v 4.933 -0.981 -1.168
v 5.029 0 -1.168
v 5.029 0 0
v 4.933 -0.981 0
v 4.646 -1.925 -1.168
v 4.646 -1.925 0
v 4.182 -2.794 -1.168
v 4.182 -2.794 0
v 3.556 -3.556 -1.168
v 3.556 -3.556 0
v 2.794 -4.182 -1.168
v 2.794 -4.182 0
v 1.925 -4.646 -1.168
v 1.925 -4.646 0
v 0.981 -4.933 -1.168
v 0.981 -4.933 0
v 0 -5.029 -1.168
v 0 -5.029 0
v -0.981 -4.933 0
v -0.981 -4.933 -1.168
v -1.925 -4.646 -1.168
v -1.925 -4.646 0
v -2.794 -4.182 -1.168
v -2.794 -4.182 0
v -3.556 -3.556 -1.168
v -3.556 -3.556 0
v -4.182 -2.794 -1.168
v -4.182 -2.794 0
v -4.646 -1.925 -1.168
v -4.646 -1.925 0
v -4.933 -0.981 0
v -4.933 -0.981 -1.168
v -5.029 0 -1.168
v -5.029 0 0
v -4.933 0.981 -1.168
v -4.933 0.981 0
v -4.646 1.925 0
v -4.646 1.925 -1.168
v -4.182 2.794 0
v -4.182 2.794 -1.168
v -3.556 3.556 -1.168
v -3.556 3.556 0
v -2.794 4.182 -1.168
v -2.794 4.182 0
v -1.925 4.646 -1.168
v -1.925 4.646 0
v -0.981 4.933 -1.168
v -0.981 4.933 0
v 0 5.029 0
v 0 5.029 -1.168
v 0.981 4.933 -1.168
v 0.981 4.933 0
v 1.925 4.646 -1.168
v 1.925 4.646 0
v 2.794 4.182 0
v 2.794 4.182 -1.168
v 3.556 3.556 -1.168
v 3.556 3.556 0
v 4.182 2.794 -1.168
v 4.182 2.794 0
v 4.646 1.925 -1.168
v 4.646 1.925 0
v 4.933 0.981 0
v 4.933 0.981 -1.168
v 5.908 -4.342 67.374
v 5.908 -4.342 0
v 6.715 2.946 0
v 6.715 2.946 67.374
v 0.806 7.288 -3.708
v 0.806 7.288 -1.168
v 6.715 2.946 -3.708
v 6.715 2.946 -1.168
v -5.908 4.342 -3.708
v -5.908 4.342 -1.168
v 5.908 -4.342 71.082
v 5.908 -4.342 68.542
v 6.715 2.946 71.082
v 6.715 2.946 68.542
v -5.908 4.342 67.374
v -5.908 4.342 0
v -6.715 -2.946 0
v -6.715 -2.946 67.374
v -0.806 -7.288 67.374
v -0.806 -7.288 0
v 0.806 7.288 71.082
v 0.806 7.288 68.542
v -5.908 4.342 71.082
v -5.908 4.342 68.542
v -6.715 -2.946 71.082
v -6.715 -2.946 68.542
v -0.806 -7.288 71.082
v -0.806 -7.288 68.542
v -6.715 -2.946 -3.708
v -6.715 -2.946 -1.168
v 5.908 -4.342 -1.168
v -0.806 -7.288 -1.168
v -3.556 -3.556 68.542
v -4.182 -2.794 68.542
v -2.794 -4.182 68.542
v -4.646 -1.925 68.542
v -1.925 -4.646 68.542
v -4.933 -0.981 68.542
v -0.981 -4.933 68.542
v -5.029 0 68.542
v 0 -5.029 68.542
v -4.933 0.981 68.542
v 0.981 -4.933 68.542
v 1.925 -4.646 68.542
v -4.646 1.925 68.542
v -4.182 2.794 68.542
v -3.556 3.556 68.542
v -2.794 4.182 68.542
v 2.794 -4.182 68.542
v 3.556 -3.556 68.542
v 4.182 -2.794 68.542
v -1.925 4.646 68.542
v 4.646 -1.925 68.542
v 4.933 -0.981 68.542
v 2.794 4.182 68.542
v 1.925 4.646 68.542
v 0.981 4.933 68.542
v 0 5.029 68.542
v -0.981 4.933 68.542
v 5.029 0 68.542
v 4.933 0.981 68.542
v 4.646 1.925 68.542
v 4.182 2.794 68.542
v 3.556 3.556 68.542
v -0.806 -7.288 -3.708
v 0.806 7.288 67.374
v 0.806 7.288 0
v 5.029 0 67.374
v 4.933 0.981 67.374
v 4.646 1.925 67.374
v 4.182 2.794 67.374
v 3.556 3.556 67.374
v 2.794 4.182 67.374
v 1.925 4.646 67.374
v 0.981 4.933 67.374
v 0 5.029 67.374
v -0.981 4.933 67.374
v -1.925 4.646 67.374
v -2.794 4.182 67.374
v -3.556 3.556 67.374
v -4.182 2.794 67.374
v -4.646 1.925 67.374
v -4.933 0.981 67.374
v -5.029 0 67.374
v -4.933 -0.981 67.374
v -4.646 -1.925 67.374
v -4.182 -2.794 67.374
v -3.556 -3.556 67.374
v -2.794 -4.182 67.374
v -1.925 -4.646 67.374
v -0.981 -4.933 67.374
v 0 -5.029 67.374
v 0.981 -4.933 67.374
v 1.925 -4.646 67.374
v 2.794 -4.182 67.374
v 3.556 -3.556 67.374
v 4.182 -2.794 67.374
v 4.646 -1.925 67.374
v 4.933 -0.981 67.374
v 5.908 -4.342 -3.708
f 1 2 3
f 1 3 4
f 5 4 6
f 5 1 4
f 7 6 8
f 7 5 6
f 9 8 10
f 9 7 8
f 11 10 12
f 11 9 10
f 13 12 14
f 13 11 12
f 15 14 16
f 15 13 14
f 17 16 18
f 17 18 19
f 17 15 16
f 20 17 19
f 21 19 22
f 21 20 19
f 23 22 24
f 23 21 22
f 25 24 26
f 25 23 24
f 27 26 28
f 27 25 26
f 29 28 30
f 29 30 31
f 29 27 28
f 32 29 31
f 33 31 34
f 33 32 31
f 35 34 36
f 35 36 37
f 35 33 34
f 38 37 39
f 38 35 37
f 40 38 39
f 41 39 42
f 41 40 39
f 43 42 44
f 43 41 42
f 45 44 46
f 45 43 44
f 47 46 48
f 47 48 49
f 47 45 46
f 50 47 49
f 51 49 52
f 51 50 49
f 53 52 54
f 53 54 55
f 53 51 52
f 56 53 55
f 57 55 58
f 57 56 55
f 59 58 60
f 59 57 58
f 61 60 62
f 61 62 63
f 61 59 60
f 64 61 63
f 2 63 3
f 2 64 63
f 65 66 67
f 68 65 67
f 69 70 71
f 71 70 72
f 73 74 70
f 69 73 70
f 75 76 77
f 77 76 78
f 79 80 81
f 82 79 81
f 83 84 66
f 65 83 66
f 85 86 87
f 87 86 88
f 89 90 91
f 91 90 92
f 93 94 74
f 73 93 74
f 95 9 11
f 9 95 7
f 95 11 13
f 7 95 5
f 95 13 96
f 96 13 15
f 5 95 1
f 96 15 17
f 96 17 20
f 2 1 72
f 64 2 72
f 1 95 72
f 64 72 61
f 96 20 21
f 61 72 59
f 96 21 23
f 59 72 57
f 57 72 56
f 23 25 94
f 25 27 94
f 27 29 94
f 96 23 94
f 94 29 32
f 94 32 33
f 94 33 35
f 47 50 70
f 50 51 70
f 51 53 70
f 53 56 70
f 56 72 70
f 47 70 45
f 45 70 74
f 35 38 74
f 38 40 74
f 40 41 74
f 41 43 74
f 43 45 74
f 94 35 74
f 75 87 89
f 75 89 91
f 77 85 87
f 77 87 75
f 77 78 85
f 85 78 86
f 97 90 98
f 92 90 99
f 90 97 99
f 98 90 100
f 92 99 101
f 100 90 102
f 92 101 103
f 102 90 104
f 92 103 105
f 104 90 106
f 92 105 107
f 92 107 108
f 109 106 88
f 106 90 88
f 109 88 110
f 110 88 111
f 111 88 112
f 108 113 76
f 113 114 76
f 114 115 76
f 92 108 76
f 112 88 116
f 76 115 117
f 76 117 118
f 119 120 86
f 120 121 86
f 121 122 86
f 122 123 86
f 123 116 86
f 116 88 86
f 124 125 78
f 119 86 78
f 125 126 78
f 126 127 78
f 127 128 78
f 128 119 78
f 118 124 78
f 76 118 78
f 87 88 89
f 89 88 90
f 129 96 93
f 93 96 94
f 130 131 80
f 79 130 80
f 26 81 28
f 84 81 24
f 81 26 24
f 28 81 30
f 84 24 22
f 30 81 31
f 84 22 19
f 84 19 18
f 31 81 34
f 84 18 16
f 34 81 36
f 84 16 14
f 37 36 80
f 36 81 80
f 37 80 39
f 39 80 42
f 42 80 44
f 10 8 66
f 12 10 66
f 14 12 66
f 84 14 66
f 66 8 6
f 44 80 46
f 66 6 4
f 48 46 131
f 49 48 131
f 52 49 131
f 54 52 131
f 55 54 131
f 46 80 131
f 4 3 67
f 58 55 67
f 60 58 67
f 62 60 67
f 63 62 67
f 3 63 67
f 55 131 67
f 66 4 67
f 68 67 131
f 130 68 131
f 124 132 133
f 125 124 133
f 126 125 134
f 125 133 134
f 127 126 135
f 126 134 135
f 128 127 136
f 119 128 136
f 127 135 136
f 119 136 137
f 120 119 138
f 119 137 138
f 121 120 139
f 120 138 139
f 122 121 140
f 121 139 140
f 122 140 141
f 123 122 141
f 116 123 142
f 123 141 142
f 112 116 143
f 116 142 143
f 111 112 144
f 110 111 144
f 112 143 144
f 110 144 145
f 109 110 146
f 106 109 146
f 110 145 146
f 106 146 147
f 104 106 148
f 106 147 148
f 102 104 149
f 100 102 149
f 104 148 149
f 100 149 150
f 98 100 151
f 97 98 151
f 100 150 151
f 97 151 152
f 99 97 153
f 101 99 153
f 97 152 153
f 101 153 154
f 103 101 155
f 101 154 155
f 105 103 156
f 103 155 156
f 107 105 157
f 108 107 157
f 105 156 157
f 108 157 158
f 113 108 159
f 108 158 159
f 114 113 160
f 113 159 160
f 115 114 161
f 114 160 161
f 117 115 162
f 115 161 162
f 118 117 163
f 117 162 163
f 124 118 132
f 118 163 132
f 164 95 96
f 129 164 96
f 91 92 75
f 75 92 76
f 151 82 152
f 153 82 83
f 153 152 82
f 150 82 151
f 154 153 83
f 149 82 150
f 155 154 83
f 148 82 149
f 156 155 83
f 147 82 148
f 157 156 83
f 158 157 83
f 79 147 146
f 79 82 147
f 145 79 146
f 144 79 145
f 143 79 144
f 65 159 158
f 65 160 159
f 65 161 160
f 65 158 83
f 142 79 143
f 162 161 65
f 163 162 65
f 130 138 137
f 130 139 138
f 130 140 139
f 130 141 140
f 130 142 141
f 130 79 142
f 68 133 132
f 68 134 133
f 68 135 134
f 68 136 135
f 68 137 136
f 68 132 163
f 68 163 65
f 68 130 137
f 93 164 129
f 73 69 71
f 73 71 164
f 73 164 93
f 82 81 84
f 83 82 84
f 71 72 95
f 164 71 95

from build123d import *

# Parameters (mm, degrees)
BOSS_EXTRUDE1_DEPTH = 67.3735
SKETCH2_R           = 5.0292
BOSS_EXTRUDE2_DEPTH = 1.1684
BOSS_EXTRUDE3_DEPTH = 2.54
BOSS_EXTRUDE4_START = 1.1684
SKETCH5_R           = 5.0292
BOSS_EXTRUDE4_DEPTH = 1.1684
BOSS_EXTRUDE5_DEPTH = 2.54


with BuildPart() as part:
    # Sketch1 → Boss-Extrude1 (new body)
    with BuildSketch(Plane.XY):
        Polygon((5.908332382, -4.342227746), (6.714645728, 2.945652064), (0.806313346, 7.28787981), (-5.908332382, 4.342227746), (-6.714645728, -2.945652064), (-0.806313346, -7.28787981), align=None)
    extrude(amount=BOSS_EXTRUDE1_DEPTH)

    # Sketch2 → Boss-Extrude2 (add)
    with BuildSketch(Plane.XY.offset(67.3735)):
        Circle(SKETCH2_R)
    extrude(amount=BOSS_EXTRUDE2_DEPTH)

    # Sketch3 → Boss-Extrude3 (add)
    with BuildSketch(Plane.XY.offset(68.5419)):
        Polygon((-0.806313346, -7.28787981), (5.908332382, -4.342227746), (6.714645728, 2.945652064), (0.806313346, 7.28787981), (-5.908332382, 4.342227746), (-6.714645728, -2.945652064), align=None)
    extrude(amount=BOSS_EXTRUDE3_DEPTH)

    # Sketch5 → Boss-Extrude4 (add)
    with BuildSketch(Plane(origin=(0, 0, 0), x_dir=(-1, 0, 0), z_dir=(0, 0, -1)).offset(BOSS_EXTRUDE4_START)):
        with Locations(Location((0, 0, 0), (0, 0, 180))):
            Circle(SKETCH5_R)
    extrude(amount=-BOSS_EXTRUDE4_DEPTH)

    # Sketch6 → Boss-Extrude5 (add)
    with BuildSketch(Plane(origin=(0, 0, -1.1684), x_dir=(-1, 0, 0), z_dir=(0, 0, -1))):
        Polygon((-5.908332382, -4.342227746), (0.806313346, -7.28787981), (6.714645728, -2.945652064), (5.908332382, 4.342227746), (-0.806313346, 7.28787981), (-6.714645728, 2.945652064), align=None)
    extrude(amount=BOSS_EXTRUDE5_DEPTH)


solid = part.part
